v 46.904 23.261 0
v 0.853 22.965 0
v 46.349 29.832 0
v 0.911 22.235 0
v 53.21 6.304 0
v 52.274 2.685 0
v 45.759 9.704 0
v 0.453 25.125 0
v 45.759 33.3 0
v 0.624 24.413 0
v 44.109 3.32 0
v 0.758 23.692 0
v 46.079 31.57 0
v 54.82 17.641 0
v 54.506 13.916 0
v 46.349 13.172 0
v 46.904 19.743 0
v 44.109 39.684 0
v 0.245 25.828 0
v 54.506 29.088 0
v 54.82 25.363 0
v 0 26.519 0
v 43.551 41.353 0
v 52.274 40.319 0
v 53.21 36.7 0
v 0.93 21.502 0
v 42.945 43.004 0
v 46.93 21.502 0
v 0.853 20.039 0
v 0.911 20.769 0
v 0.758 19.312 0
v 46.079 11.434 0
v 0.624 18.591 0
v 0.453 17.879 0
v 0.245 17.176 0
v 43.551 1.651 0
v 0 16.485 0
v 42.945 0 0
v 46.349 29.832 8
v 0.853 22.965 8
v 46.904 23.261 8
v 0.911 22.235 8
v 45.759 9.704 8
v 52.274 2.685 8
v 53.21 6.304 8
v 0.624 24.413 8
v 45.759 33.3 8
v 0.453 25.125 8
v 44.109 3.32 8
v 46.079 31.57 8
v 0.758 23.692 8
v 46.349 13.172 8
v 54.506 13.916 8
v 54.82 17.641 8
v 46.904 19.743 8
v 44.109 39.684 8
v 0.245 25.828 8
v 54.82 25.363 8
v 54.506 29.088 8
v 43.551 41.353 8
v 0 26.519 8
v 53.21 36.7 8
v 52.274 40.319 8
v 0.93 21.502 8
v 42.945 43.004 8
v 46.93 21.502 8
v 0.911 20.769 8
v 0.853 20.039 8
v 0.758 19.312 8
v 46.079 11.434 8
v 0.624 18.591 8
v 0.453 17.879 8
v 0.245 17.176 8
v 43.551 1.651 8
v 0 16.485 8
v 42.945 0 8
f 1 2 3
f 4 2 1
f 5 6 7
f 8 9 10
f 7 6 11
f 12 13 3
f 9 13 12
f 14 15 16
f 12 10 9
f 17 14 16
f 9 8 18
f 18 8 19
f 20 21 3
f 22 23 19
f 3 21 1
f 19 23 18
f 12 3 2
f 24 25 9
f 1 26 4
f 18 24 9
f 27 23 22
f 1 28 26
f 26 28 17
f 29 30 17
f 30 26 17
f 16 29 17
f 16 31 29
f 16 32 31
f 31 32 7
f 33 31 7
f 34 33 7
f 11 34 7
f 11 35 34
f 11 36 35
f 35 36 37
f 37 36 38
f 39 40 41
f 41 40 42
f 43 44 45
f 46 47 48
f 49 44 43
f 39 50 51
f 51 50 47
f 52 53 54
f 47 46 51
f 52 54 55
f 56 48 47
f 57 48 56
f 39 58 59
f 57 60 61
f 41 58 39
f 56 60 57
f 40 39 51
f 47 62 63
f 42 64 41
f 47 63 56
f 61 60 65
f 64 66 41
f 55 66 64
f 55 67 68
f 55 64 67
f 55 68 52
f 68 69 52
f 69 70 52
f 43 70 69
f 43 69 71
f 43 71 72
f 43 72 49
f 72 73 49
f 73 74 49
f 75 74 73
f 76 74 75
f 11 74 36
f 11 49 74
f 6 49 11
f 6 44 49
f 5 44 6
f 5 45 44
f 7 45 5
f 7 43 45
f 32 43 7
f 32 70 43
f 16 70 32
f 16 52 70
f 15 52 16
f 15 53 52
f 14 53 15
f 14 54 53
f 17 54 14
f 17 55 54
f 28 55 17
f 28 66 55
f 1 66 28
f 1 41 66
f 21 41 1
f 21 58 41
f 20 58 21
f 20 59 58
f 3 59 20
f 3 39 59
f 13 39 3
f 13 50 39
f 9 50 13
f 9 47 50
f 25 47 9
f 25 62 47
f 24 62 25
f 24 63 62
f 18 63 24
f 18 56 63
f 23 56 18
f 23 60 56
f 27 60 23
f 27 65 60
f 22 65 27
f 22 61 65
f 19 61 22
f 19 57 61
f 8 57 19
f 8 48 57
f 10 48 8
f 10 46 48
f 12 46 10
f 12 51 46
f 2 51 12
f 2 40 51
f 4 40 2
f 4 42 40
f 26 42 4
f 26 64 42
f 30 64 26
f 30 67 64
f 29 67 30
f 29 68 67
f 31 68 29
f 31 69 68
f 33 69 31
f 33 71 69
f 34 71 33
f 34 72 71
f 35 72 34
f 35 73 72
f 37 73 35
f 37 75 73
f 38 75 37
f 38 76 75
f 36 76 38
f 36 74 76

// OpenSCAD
$fn = 32;

// ----------------------------------------------------------------------
// Gear sector: 4 teeth on 42 degrees
// ----------------------------------------------------------------------

// --- parameters (mm) ---
sector_angle = 42;        // sector angle, degrees
root_r = 60;              // root circle radius
tooth_h = 8;              // tooth height over the root circle
teeth = 4;                // number of teeth on the sector
hub_r = 14;               // hub bore radius
plate_t = 8;              // sector thickness, Z
arc_step = 3;             // sampling step of the root/hub arcs, degrees

tip_r = root_r + tooth_h;  // tip circle radius

profile = [[42.945, 0], [43.551, 1.651], [44.109, 3.32], [52.274, 2.685], [53.21, 6.304], [45.759, 9.704], [46.079, 11.434], [46.349, 13.172], [54.506, 13.916], [54.82, 17.641], [46.904, 19.743], [46.93, 21.502], [46.904, 23.261], [54.82, 25.363], [54.506, 29.088], [46.349, 29.832], [46.079, 31.57], [45.759, 33.3], [53.21, 36.7], [52.274, 40.319], [44.109, 39.684], [43.551, 41.353], [42.945, 43.004], [0, 26.519], [0.245, 25.828], [0.453, 25.125], [0.624, 24.413], [0.758, 23.692], [0.853, 22.965], [0.911, 22.235], [0.93, 21.502], [0.911, 20.769], [0.853, 20.039], [0.758, 19.312], [0.624, 18.591], [0.453, 17.879], [0.245, 17.176], [0, 16.485]];  // primary outline, 38 points, counter clockwise

// --- the one profile operation ---
linear_extrude(height = plate_t) polygon(points = profile);
